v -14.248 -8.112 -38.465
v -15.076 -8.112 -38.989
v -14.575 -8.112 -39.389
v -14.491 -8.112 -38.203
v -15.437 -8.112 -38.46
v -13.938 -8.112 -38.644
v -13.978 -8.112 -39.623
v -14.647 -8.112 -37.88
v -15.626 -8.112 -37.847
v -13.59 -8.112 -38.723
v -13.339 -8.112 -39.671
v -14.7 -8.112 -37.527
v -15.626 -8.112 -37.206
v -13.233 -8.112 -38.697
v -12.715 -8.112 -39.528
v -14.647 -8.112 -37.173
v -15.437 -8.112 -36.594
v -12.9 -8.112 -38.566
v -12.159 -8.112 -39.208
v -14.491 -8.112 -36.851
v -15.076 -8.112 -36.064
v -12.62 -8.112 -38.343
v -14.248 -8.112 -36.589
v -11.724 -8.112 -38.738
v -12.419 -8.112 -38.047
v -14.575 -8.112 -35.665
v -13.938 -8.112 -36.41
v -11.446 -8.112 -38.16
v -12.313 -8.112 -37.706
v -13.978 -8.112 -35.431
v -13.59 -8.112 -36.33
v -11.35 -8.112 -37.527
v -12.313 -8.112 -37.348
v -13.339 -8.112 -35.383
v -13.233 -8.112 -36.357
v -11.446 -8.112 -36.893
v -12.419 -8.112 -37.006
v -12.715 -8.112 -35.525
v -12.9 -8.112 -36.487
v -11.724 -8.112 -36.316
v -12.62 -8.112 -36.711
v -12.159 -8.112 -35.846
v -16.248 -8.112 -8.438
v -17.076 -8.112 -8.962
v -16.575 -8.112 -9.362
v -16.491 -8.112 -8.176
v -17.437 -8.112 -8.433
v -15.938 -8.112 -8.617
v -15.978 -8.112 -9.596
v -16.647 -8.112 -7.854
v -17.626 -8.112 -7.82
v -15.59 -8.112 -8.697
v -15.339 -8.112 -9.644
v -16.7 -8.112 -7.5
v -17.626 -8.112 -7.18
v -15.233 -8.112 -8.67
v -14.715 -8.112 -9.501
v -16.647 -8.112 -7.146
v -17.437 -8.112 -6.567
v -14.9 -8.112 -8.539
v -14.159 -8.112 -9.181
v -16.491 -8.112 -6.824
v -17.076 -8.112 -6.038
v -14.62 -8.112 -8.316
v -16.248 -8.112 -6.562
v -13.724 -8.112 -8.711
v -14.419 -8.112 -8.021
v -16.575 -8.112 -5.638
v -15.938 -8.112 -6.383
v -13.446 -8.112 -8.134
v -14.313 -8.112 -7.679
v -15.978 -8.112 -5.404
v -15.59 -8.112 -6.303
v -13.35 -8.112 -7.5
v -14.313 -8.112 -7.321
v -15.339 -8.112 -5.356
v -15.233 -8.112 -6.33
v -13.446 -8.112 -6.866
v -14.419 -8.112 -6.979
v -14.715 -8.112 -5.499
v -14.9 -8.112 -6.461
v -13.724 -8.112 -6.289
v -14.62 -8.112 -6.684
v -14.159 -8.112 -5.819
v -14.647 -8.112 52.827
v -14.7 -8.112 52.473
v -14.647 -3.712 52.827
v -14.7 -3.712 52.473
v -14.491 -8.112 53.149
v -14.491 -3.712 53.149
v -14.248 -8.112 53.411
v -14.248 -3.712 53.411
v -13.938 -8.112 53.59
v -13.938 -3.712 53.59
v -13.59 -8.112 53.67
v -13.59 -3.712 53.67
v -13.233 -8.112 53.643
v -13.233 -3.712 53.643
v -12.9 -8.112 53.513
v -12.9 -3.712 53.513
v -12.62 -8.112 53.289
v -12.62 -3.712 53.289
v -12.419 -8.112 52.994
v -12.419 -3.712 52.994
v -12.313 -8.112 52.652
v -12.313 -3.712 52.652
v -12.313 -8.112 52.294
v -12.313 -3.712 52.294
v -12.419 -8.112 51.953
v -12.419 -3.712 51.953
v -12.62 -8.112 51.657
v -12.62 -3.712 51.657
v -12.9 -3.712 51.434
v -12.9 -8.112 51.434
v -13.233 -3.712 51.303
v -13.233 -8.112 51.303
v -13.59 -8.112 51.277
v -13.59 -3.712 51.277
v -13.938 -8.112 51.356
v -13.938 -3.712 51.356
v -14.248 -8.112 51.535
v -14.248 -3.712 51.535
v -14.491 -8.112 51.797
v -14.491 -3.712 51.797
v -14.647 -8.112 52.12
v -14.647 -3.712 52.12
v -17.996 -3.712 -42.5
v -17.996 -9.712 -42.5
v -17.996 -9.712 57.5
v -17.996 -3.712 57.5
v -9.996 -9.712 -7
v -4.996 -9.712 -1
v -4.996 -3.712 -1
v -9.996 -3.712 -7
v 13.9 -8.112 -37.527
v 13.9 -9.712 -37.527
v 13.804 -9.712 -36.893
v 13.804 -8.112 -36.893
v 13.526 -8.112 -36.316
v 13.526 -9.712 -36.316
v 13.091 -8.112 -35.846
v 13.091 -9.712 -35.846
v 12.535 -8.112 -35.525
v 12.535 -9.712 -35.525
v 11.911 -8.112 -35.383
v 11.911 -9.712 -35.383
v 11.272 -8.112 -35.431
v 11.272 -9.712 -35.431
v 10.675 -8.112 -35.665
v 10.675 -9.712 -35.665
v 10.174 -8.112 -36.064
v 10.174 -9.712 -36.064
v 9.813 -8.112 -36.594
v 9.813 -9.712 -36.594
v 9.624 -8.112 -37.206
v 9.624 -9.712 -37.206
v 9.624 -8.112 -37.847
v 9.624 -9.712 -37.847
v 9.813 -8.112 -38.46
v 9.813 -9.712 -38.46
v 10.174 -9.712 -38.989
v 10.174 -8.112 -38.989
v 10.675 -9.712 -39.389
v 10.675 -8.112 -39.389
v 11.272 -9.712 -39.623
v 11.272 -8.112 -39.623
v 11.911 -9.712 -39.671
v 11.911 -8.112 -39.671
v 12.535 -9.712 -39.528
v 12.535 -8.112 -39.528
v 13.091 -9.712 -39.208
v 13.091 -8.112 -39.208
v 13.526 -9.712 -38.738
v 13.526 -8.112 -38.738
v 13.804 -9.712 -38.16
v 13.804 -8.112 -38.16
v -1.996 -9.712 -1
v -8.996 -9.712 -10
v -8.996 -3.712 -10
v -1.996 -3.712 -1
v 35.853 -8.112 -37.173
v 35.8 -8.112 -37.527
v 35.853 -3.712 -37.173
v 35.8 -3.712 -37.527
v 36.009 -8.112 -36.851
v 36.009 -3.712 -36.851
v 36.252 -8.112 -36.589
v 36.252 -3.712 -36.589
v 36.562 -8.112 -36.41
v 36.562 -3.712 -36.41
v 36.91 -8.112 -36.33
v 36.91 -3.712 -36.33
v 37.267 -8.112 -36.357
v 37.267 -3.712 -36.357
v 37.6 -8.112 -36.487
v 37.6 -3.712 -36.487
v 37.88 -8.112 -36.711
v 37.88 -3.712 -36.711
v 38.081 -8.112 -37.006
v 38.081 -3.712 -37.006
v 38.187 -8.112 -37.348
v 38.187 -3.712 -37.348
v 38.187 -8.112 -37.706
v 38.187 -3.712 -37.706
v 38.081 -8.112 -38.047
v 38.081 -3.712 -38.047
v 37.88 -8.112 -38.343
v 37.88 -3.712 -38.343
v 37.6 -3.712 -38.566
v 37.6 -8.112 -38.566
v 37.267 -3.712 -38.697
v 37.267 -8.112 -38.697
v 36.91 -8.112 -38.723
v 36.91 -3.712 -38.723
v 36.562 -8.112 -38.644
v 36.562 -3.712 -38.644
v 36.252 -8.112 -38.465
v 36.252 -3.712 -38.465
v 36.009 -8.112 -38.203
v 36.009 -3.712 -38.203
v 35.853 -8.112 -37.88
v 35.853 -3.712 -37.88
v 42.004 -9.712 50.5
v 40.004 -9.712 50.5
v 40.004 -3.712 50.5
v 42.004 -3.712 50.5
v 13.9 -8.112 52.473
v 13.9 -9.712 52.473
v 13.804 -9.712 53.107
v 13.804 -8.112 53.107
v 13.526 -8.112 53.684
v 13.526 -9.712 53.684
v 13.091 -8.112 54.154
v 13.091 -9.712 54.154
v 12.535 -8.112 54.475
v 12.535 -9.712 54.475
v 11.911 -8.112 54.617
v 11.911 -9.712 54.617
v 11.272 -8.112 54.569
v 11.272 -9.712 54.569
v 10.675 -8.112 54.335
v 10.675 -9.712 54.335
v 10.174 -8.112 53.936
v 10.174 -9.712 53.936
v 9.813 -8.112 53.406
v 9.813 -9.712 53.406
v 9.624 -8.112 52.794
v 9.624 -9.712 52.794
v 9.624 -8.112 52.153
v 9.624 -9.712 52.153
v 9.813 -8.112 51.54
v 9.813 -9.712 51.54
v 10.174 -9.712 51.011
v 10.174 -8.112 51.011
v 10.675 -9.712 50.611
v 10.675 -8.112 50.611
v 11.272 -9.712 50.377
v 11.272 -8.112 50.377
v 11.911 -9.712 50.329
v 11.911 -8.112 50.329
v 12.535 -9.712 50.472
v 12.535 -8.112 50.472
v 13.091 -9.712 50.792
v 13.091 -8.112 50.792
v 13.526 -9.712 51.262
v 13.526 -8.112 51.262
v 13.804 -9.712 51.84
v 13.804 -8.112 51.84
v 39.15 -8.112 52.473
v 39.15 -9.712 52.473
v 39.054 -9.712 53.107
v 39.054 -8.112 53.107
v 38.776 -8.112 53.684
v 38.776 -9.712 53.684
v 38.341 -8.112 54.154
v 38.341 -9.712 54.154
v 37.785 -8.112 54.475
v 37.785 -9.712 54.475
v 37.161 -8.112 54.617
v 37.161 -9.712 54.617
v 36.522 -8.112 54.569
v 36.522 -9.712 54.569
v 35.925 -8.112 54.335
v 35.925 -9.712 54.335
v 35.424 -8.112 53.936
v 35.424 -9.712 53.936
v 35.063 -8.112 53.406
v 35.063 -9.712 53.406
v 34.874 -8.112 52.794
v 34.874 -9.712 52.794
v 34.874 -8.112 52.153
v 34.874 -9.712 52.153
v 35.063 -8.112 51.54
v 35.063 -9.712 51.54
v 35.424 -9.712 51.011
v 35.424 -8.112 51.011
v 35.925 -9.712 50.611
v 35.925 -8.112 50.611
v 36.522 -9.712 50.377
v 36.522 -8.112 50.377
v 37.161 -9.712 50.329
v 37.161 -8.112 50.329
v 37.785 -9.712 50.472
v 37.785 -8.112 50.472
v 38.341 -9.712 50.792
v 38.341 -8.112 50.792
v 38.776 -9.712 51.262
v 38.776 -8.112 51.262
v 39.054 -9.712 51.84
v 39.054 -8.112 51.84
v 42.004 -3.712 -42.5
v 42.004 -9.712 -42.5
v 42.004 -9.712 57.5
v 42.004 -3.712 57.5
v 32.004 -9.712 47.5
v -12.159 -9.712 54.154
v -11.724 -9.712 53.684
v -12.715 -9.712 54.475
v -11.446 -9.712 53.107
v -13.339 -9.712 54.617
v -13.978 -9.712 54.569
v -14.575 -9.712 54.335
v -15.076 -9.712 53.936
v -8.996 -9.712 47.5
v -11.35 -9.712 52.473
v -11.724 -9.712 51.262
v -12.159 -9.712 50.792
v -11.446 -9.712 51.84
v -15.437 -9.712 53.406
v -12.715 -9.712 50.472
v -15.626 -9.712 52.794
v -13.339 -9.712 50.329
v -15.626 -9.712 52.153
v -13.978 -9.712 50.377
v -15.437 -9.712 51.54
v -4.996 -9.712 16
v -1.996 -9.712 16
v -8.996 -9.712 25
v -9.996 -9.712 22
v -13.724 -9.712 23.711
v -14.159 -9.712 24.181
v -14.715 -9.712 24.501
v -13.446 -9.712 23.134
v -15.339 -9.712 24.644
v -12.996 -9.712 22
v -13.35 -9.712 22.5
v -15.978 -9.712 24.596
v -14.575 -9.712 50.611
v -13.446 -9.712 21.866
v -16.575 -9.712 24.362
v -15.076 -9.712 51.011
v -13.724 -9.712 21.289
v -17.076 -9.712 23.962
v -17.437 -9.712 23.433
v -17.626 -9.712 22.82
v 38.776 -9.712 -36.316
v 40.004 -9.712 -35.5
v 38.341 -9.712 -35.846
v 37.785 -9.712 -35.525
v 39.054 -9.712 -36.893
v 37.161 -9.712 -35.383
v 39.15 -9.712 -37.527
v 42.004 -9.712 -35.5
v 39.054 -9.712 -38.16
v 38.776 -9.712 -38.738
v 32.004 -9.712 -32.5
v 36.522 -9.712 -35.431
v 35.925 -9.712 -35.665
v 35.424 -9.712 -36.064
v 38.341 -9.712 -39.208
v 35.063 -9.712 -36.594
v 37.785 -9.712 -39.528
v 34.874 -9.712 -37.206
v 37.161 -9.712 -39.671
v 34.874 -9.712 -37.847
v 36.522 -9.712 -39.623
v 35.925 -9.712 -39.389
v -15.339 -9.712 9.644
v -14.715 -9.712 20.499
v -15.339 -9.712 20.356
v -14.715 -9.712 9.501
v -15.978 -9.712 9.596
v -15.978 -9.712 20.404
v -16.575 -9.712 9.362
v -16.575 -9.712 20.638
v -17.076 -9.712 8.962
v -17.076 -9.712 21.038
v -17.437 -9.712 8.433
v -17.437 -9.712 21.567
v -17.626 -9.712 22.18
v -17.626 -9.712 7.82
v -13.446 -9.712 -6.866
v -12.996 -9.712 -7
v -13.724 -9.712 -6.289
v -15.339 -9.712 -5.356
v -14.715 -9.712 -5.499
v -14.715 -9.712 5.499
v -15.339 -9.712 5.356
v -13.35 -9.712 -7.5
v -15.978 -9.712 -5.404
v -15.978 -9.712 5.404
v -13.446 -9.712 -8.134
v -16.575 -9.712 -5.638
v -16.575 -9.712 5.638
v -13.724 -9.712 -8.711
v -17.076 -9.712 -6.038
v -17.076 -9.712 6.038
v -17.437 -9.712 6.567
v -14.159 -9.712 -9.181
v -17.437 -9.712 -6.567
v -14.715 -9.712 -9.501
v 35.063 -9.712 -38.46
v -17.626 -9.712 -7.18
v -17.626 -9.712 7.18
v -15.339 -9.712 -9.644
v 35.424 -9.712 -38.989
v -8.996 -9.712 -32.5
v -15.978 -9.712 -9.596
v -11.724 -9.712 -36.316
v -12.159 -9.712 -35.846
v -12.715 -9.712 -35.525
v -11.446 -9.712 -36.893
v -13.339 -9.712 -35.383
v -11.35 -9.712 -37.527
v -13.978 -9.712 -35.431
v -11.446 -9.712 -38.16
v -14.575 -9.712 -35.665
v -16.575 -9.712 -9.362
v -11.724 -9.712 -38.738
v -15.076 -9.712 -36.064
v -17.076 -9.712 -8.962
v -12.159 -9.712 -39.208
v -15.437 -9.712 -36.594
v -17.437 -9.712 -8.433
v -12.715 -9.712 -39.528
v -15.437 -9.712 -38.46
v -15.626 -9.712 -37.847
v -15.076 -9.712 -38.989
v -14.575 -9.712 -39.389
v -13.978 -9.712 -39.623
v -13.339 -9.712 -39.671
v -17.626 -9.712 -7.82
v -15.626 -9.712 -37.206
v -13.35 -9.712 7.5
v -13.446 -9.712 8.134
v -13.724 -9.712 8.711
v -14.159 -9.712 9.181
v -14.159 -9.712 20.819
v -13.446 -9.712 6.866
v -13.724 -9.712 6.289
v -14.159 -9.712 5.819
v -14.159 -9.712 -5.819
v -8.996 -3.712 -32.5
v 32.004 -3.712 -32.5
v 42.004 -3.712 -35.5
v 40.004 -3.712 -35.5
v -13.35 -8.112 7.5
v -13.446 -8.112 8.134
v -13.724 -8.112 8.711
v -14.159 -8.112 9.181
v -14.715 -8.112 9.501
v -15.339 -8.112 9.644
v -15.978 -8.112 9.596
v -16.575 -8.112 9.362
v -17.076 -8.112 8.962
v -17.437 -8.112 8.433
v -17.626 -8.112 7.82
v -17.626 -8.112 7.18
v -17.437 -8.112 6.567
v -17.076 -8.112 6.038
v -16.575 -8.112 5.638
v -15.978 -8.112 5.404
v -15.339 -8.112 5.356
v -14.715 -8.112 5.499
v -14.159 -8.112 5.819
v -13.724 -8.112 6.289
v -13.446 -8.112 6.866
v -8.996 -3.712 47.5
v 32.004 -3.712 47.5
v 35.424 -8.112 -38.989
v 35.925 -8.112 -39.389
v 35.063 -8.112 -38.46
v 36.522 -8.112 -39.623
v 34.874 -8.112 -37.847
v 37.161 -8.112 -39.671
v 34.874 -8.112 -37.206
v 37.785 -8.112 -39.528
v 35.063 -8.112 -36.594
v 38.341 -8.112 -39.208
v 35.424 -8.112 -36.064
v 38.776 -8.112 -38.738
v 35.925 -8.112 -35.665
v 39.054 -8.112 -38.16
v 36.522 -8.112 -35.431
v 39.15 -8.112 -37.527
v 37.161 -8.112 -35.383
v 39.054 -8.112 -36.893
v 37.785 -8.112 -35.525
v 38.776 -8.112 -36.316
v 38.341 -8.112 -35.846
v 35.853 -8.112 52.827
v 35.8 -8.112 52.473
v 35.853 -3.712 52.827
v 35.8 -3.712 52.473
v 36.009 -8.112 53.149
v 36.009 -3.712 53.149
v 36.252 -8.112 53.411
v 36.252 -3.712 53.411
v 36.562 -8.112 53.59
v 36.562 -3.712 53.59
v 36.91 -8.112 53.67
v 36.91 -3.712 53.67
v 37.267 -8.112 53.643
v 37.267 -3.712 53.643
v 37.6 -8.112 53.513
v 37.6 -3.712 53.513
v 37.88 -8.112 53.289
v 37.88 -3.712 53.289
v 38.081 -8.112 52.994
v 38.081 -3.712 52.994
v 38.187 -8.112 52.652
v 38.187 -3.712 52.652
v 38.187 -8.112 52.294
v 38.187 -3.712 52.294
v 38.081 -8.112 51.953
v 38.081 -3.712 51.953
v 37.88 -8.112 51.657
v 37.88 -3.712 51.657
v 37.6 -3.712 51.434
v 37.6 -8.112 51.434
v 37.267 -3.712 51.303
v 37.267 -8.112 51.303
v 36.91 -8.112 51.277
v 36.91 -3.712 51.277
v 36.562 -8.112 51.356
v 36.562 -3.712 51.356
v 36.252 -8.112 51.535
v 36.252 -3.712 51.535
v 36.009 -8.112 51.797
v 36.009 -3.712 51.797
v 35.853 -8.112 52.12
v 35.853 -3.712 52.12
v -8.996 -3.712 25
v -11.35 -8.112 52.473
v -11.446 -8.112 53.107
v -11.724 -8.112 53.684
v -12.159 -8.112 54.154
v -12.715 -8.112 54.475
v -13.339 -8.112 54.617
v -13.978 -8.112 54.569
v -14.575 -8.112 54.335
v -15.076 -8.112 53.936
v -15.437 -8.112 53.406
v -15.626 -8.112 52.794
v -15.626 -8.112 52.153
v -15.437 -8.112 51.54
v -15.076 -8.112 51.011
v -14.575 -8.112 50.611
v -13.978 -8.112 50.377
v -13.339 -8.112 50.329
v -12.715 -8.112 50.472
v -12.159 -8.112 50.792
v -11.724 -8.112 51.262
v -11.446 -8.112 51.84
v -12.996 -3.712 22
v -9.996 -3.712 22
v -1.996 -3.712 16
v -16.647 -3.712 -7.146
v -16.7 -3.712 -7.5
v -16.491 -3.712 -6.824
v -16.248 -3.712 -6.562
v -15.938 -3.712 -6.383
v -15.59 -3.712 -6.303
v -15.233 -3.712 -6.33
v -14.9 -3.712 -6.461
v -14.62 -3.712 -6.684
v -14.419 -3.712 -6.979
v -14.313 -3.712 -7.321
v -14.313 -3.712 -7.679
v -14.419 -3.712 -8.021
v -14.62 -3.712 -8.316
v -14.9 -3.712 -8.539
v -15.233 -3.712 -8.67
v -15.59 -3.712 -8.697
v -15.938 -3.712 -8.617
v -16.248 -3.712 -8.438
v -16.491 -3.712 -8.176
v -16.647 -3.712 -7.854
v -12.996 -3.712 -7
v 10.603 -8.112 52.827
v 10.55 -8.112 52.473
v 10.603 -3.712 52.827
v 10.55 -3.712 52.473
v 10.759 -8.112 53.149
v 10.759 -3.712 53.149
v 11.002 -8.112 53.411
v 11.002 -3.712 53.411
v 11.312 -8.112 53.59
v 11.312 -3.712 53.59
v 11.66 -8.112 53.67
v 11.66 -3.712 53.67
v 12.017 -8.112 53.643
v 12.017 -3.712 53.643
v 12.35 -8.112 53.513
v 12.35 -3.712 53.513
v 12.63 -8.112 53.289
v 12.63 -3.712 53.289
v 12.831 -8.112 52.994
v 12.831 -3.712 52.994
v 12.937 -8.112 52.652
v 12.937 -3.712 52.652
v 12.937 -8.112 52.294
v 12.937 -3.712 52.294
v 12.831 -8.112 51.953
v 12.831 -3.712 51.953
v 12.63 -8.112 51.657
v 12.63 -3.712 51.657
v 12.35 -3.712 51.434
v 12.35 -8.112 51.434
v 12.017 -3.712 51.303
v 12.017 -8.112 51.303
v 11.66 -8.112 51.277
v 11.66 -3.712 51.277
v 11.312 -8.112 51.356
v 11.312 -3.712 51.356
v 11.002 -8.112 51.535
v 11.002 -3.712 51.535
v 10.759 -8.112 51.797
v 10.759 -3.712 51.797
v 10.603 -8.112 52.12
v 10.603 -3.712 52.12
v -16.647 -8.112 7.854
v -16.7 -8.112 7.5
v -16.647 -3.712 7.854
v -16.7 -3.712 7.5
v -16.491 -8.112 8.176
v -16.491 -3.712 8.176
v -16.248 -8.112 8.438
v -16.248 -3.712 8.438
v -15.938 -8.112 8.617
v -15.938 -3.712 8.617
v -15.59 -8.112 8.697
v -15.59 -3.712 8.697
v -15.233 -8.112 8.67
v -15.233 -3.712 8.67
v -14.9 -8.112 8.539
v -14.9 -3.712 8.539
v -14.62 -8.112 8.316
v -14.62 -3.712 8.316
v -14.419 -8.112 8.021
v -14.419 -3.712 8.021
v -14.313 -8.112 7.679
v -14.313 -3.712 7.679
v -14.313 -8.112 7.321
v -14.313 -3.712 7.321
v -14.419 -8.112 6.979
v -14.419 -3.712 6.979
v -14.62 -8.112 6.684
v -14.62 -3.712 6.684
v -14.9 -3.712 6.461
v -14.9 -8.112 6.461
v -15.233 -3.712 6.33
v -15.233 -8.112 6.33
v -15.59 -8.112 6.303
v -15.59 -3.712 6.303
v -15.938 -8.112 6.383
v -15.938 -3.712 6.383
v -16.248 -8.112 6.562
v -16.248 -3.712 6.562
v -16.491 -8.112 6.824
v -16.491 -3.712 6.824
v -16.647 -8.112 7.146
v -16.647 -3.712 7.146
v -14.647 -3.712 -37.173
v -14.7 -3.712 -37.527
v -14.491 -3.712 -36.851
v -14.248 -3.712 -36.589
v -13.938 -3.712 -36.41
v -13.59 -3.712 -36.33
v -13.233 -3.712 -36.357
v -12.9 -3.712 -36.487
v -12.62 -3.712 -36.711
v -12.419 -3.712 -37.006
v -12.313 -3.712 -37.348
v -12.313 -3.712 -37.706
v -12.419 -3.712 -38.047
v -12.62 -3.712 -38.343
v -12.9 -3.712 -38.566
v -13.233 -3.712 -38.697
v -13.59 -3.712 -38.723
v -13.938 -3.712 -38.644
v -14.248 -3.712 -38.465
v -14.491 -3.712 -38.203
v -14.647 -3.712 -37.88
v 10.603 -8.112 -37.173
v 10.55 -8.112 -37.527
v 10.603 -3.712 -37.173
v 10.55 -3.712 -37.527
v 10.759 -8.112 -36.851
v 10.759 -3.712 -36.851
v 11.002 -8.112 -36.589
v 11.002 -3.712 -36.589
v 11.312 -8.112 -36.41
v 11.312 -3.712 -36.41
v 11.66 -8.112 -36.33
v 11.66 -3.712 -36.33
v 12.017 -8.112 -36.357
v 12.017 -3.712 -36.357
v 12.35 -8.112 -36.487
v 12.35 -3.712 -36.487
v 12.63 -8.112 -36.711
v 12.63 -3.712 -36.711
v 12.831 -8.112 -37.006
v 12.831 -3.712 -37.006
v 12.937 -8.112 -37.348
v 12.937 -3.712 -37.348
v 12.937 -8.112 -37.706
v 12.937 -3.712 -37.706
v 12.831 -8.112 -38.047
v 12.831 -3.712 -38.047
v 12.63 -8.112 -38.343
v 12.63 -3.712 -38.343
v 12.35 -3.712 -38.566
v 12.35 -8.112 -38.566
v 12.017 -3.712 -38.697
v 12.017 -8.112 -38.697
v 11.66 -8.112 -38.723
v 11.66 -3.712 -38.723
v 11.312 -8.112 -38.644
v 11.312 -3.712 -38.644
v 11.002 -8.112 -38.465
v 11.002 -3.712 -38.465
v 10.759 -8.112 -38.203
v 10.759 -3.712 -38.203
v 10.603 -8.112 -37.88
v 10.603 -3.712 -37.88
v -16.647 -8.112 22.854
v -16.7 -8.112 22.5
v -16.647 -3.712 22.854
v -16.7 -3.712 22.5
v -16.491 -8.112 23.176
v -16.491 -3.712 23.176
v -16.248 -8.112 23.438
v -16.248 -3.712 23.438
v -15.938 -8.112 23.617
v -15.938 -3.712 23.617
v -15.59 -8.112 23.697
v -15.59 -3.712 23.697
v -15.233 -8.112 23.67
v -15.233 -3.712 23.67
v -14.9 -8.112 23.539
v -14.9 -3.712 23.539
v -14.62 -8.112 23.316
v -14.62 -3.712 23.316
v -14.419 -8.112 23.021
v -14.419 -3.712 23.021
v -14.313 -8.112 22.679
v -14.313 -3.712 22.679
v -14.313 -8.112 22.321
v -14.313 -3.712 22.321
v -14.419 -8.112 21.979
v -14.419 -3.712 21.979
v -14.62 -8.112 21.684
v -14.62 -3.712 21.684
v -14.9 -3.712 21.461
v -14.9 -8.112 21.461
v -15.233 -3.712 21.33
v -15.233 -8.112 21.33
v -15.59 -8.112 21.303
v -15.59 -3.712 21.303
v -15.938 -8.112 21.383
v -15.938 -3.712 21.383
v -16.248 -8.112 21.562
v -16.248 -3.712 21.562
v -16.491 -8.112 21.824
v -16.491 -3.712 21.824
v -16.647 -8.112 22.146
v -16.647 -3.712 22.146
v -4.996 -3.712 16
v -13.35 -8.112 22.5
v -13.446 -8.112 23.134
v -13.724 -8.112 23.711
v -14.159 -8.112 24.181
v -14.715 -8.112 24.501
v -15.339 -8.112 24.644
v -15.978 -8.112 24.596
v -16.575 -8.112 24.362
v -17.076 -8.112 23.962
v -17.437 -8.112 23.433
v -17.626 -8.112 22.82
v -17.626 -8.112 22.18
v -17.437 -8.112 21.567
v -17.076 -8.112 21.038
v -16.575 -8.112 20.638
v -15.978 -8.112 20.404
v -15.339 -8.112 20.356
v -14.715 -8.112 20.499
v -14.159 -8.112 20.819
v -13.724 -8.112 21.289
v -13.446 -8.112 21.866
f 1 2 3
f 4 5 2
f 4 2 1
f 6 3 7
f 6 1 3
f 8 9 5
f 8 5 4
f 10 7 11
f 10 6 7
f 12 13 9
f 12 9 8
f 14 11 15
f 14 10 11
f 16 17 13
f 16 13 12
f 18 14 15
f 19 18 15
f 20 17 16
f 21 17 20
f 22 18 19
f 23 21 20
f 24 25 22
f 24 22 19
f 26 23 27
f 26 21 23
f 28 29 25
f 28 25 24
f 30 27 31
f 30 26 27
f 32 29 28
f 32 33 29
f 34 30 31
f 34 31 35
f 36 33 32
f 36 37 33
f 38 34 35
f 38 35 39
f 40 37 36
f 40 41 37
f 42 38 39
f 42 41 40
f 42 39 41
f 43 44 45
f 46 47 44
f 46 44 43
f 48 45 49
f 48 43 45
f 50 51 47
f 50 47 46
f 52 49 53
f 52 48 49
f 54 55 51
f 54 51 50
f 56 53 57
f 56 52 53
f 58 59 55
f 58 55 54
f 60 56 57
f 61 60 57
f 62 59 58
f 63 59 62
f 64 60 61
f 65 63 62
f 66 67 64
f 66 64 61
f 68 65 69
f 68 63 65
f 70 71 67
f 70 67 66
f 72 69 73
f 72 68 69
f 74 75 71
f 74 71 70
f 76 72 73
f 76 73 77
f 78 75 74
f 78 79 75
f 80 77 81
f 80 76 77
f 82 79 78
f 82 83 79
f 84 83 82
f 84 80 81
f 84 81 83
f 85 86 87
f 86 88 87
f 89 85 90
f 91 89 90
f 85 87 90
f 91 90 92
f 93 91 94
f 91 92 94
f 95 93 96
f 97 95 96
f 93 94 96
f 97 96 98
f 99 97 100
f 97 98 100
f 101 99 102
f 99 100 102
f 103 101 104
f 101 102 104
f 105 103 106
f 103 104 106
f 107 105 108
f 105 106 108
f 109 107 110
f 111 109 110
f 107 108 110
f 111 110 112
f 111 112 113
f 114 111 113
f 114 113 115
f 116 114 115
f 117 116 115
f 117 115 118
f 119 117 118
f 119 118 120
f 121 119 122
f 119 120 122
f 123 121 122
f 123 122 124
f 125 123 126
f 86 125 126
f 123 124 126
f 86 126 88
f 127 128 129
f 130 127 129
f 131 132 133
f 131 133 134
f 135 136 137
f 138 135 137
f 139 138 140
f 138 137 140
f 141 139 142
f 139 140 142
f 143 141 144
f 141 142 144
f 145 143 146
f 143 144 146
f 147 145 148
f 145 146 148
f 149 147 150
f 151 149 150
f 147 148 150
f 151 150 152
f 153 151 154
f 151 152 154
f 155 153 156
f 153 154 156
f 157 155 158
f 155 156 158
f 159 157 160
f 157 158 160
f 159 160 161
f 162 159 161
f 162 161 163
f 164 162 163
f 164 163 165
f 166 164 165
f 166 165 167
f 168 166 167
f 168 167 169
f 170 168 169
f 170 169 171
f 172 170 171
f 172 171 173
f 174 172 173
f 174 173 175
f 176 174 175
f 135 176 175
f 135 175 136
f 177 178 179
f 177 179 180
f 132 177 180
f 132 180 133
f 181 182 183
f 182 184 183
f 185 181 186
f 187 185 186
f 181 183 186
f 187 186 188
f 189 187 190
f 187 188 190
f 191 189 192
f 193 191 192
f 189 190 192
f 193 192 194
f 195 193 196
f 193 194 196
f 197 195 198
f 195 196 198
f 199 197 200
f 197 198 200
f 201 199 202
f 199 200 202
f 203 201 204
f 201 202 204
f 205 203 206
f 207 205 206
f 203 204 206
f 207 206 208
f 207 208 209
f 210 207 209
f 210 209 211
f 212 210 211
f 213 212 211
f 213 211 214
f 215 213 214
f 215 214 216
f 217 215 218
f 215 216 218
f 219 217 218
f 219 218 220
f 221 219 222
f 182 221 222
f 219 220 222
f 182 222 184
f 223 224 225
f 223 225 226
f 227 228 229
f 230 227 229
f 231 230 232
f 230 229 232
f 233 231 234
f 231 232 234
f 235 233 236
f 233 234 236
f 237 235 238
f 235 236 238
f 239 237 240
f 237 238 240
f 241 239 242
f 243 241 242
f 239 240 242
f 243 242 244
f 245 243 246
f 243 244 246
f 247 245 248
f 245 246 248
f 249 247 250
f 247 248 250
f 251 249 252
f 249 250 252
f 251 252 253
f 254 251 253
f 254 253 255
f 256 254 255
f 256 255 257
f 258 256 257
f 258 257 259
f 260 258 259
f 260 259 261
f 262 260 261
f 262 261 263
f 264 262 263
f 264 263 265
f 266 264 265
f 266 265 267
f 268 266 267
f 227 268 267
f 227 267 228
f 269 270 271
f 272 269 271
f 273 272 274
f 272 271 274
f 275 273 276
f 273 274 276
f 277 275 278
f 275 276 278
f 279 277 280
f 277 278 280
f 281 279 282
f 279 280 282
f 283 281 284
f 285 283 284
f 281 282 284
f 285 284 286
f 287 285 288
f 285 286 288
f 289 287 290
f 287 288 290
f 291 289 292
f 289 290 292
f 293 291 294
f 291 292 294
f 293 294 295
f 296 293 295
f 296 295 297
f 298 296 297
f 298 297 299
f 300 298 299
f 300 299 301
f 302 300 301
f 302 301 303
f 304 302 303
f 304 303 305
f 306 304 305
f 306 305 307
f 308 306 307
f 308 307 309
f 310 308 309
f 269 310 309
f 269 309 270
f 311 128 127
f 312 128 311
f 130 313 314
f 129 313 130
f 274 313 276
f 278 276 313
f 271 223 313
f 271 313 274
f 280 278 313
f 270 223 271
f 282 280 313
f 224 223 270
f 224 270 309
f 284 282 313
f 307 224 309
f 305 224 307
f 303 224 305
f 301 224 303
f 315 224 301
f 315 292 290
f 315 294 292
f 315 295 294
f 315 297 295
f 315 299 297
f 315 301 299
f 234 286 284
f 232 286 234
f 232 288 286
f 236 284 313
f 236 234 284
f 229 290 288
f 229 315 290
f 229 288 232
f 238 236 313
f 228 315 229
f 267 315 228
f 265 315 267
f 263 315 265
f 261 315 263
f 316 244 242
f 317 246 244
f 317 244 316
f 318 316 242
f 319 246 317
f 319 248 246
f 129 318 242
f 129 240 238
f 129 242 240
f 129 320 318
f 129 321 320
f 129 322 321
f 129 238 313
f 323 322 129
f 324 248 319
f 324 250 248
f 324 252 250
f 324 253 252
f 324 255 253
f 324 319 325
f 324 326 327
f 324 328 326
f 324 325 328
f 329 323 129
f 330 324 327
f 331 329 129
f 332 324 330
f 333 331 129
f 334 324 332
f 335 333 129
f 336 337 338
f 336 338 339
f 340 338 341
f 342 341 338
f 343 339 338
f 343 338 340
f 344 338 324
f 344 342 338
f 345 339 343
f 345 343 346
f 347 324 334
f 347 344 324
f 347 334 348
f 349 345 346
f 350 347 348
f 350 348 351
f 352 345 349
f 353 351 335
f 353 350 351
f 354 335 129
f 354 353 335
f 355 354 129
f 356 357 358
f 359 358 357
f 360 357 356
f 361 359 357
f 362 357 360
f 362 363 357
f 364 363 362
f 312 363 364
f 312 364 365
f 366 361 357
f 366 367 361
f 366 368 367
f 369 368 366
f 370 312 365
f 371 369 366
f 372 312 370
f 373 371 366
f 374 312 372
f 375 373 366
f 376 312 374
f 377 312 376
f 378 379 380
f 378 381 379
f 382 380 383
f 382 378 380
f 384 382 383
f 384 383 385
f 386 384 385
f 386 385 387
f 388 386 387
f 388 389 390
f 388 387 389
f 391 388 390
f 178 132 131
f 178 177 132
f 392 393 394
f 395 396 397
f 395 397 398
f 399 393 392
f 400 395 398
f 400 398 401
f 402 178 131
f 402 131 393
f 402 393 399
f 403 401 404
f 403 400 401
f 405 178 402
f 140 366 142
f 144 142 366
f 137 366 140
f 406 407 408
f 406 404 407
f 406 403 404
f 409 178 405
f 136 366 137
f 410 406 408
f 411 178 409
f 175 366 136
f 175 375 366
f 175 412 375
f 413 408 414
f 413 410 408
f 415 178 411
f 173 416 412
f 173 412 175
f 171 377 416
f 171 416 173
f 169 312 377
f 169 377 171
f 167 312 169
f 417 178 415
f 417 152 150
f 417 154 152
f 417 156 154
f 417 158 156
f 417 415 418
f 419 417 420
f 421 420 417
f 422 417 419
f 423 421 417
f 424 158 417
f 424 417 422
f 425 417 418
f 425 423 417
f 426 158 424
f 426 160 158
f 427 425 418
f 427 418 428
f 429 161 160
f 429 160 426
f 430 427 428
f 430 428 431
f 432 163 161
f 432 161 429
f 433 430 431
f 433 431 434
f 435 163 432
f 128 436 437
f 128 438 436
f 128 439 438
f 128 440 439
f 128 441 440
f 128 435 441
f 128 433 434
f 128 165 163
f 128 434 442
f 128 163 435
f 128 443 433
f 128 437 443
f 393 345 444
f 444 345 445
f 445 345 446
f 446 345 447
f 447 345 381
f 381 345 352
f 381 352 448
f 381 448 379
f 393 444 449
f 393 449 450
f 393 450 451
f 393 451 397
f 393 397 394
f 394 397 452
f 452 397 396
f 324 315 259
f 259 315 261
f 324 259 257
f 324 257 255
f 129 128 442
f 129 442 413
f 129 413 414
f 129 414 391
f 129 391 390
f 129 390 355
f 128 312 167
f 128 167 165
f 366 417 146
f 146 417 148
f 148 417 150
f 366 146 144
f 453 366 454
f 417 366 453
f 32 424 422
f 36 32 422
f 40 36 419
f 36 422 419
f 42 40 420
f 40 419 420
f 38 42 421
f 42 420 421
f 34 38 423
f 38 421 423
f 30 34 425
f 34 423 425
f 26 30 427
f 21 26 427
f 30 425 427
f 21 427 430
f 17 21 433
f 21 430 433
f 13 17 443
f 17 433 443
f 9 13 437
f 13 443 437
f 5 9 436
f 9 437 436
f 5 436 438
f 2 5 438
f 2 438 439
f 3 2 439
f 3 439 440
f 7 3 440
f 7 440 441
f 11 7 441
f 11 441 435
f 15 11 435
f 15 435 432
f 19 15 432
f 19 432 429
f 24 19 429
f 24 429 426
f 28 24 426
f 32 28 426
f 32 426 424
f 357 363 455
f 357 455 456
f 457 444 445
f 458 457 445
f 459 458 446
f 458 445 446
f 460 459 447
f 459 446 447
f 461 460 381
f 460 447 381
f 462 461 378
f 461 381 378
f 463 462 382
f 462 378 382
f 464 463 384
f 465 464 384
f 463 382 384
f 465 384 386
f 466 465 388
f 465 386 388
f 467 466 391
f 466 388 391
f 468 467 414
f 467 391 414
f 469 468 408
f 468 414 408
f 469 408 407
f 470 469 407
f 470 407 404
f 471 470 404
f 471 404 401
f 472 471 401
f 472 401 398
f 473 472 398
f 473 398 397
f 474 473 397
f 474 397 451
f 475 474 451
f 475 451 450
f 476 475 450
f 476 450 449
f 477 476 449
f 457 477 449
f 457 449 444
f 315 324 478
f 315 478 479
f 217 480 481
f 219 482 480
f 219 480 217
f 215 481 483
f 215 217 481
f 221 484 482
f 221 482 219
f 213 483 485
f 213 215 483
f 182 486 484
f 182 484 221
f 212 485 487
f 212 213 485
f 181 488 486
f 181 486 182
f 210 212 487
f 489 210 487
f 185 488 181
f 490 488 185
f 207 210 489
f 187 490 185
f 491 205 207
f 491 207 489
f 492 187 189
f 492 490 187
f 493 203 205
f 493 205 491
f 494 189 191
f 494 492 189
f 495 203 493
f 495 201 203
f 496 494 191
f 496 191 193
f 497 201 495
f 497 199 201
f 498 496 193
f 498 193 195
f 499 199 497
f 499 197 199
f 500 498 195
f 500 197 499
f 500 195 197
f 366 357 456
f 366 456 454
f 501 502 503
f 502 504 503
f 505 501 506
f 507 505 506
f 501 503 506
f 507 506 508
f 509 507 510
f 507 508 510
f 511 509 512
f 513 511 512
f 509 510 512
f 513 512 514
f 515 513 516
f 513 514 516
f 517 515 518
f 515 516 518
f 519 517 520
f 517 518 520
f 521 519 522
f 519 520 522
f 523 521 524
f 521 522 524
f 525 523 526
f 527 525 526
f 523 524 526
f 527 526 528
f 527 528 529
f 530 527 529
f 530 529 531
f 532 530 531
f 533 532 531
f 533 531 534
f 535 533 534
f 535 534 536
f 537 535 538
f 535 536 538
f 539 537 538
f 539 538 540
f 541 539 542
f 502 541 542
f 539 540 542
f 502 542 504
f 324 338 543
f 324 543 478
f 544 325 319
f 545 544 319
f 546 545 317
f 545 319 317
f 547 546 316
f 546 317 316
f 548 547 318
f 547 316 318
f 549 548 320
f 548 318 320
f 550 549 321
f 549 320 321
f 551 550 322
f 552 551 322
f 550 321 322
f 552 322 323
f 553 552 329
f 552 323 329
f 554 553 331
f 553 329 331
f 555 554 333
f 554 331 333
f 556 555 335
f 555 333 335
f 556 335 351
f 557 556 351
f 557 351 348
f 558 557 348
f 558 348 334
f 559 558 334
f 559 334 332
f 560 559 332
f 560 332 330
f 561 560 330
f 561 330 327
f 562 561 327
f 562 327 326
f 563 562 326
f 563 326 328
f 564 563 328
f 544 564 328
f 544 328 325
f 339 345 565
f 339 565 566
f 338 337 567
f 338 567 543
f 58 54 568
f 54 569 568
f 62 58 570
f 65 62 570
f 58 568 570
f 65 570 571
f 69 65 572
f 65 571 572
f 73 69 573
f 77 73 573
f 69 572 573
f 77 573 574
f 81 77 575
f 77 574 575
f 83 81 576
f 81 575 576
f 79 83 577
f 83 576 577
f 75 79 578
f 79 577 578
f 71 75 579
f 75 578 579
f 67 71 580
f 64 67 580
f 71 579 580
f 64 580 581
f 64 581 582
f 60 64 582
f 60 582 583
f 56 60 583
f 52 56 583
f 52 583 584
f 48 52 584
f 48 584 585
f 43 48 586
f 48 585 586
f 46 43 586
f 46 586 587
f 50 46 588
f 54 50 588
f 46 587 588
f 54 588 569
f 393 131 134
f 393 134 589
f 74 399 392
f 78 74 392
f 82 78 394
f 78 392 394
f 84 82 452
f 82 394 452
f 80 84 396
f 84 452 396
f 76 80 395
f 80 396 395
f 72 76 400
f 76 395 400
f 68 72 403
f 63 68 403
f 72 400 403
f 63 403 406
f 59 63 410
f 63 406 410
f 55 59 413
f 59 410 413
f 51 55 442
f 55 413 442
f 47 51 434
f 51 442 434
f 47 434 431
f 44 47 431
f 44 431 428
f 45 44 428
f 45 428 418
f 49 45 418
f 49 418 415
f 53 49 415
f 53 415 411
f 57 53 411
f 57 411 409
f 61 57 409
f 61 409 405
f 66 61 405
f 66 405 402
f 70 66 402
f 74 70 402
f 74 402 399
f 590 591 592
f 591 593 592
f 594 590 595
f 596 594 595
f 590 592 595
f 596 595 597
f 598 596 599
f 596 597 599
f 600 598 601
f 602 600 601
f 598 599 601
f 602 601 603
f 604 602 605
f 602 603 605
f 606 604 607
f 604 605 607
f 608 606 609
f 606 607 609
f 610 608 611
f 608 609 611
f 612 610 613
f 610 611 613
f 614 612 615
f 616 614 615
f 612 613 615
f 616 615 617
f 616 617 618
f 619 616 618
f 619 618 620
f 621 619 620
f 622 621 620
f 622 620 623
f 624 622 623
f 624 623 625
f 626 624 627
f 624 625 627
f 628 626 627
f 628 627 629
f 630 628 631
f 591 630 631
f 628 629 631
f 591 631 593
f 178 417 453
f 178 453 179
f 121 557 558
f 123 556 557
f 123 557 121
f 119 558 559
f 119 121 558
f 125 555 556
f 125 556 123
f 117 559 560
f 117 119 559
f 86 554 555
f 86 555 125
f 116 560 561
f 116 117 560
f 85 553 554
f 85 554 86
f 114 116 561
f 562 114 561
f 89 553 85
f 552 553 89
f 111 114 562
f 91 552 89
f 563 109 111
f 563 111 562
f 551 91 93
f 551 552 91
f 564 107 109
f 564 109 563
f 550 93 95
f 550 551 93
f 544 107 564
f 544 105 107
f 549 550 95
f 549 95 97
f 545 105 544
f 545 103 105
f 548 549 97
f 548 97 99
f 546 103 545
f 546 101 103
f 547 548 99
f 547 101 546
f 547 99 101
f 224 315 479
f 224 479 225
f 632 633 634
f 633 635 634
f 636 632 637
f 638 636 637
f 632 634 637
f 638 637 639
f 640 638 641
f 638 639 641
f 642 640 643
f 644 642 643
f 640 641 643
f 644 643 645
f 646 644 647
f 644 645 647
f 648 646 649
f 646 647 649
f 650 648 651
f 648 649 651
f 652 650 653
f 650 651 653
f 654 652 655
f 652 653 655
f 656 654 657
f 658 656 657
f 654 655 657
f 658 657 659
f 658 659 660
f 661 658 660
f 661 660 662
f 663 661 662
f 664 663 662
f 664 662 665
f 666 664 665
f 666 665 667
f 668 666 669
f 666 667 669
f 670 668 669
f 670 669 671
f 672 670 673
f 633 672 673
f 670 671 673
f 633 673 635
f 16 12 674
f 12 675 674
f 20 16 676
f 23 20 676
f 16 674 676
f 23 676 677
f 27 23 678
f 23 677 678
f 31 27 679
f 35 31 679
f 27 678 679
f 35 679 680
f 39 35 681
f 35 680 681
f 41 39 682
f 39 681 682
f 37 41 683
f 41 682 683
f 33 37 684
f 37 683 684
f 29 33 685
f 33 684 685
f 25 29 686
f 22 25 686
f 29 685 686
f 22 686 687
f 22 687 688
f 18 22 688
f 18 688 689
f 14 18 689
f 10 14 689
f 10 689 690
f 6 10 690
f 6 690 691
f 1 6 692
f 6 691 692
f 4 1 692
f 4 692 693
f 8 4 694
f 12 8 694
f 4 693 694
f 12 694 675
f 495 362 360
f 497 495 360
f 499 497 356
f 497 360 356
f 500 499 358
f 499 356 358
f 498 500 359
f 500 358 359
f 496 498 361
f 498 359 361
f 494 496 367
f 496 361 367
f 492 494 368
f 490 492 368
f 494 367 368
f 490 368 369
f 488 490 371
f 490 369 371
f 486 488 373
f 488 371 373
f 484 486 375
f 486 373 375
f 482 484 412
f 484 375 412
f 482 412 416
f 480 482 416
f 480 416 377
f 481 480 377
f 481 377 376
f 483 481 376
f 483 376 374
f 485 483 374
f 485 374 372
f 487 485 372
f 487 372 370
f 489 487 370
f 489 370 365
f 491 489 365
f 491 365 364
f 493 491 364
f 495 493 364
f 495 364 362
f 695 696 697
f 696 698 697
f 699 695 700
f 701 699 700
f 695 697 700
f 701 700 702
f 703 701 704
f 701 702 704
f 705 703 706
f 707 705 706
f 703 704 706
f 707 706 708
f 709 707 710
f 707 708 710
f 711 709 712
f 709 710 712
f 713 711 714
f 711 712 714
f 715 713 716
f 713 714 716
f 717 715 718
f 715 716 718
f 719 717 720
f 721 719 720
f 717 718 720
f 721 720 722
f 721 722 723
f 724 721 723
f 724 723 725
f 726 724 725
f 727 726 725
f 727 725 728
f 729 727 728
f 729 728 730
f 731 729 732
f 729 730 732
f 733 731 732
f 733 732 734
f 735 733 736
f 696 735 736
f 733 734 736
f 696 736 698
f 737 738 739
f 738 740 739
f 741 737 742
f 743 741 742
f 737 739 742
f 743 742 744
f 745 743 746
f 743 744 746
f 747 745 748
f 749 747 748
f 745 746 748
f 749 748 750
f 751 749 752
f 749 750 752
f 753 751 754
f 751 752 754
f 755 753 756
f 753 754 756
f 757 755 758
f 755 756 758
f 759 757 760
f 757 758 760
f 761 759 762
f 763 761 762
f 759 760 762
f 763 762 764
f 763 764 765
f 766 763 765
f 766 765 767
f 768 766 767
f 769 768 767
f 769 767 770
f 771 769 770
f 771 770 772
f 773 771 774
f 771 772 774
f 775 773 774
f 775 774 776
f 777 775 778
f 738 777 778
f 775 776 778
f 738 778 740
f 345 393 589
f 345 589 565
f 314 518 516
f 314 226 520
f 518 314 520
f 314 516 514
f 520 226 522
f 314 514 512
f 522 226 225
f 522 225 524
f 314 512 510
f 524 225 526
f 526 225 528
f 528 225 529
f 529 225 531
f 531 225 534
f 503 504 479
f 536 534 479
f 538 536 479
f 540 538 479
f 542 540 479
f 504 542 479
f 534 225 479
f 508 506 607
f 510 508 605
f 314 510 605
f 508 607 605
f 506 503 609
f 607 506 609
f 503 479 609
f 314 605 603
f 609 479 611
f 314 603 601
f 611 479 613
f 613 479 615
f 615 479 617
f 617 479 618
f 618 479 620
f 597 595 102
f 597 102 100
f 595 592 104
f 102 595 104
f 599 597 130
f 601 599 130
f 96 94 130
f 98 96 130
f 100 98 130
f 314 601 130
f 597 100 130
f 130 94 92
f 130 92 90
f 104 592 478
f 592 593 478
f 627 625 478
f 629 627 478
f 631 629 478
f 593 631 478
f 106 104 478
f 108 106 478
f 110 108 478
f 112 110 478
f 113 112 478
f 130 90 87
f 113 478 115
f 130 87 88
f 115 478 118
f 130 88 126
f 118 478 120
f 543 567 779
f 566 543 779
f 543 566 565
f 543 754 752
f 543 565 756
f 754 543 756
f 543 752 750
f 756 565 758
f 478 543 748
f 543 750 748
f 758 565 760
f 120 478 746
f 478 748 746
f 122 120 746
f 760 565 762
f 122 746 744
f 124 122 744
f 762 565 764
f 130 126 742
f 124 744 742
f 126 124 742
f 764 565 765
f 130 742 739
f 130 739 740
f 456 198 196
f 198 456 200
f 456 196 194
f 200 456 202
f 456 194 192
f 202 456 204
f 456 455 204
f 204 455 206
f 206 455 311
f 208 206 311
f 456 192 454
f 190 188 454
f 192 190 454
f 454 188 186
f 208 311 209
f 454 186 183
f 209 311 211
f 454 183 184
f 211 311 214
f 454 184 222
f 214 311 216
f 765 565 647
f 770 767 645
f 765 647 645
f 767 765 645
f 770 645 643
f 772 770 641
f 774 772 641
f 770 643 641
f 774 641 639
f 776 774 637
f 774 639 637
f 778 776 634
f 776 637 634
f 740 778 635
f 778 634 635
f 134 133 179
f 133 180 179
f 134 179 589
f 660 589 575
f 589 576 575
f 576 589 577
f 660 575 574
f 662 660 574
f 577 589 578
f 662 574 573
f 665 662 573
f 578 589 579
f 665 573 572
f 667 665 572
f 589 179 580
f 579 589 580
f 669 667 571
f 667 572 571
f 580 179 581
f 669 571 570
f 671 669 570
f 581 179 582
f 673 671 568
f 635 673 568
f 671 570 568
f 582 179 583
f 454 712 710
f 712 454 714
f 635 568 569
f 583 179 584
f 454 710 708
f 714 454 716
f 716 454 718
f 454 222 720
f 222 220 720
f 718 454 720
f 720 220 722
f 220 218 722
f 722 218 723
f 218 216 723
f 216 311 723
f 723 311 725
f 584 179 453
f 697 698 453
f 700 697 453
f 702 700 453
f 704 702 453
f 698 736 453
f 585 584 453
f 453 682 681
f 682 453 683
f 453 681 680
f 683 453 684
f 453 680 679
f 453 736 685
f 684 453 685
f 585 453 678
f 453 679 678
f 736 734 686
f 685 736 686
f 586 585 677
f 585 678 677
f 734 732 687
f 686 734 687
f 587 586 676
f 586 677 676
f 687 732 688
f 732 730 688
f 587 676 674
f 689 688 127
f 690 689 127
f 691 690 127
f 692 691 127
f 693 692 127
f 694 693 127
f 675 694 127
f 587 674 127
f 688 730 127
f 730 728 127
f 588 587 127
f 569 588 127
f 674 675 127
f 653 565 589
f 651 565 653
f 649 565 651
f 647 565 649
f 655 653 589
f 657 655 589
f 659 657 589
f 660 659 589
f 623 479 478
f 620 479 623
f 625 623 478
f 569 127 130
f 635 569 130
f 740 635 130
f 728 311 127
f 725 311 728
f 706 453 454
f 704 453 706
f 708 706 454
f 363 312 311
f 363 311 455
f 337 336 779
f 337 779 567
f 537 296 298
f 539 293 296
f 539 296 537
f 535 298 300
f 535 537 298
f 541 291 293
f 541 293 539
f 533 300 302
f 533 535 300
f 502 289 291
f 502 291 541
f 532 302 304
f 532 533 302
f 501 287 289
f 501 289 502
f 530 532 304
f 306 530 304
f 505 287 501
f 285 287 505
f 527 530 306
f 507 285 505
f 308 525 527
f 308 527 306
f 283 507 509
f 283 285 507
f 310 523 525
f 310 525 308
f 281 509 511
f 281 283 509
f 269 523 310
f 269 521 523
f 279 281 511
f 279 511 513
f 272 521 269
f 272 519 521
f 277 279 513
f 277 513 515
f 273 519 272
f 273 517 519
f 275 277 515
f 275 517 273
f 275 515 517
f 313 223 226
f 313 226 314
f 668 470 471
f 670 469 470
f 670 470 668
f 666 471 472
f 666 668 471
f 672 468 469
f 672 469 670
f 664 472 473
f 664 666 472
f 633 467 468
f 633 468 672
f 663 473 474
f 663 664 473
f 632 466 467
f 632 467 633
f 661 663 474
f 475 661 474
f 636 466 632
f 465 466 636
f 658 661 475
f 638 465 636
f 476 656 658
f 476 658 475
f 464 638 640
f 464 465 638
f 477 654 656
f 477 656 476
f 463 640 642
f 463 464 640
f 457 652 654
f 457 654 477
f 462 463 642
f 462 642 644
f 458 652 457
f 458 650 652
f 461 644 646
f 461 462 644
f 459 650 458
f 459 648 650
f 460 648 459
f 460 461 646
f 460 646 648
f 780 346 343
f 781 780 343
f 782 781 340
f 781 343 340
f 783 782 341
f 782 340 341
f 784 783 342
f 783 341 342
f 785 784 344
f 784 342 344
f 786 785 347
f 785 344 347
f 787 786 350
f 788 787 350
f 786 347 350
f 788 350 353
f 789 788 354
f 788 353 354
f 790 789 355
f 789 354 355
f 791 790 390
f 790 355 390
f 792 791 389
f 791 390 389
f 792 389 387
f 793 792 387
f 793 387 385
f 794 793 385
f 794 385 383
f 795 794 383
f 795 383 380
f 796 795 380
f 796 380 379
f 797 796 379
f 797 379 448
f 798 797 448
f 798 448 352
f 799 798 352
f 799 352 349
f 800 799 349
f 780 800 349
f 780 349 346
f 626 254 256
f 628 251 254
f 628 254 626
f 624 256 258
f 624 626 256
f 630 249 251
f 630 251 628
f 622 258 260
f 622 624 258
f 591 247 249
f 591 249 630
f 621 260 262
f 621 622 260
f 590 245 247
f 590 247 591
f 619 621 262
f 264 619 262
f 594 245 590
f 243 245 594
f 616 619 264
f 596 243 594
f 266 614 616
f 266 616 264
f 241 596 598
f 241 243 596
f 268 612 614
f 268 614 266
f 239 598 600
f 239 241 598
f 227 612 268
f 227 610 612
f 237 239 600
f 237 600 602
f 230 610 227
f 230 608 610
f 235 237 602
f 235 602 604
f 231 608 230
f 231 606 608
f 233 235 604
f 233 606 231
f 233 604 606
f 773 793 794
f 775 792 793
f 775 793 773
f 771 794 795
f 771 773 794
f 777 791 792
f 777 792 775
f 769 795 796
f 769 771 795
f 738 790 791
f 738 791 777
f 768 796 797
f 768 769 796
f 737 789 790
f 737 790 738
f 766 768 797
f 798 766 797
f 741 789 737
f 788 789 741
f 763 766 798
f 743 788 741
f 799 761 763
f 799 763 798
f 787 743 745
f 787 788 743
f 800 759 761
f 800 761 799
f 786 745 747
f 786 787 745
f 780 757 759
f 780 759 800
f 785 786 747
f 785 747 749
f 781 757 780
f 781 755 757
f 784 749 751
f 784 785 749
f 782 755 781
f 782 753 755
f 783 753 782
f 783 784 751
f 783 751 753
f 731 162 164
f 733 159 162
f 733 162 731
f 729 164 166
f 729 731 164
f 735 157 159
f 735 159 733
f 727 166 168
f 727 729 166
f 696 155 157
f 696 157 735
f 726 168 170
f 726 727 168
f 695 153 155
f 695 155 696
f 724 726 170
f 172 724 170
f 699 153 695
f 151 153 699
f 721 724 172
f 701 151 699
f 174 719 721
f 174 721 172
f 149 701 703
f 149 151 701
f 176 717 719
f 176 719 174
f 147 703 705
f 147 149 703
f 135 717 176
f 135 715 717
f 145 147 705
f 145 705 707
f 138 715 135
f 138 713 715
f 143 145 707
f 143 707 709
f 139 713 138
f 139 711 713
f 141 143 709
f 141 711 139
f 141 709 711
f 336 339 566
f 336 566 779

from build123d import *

# Parameters (mm, degrees)
PAD_DEPTH           = 6
HOLE_D              = 2.4
HOLE_CBORE_D        = 4.3
HOLE_CBORE_DEPTH    = 1.6
HOLE001_D           = 2.4
HOLE001_CBORE_D     = 4.3
HOLE001_CBORE_DEPTH = 1.6


with BuildPart() as part:
    # Sketch001 → Pad (new body)
    with BuildSketch(Plane(origin=(-8.845912, -9.712389, 7.5), x_dir=(1, 0, 0), z_dir=(0, 1, 0))):
        Polygon((3.85, 8.5), (-1.15, 14.5), (-4.15, 14.5), (-4.15, -14.5), (-1.15, -14.5), (3.85, -8.5), (6.85, -8.5), (-0.15, -17.5), (-0.15, -40), (40.85, -40), (48.85, -43), (50.85, -43), (50.85, -50), (-9.15, -50), (-9.15, -17.5), (-9.15, 17.5), (-9.15, 50), (50.85, 50), (50.85, 43), (48.85, 43), (40.85, 40), (-0.15, 40), (-0.15, 17.5), (6.85, 8.5), align=None)
    extrude(amount=PAD_DEPTH)

    # Hole (through all)
    with Locations(Plane(origin=(-8.845912, -9.712389, 7.5), x_dir=(1, 0, 0), z_dir=(0, -1, 0))):
        with Locations((-6.654088, 0), (-6.654088, 15), (-6.654088, -15)):
            CounterBoreHole(HOLE_D / 2, HOLE_CBORE_D / 2, HOLE_CBORE_DEPTH)

    # Hole001 (through all)
    with Locations(Plane(origin=(-8.845912, -9.712389, 7.5), x_dir=(1, 0, 0), z_dir=(0, -1, 0))):
        with Locations((20.595912, 44.973288), (20.595912, -45.026712), (-4.654088, -45.026712), (45.845912, -45.026712), (-4.654088, 44.973288), (45.845912, 44.973288)):
            CounterBoreHole(HOLE001_D / 2, HOLE001_CBORE_D / 2, HOLE001_CBORE_DEPTH)


solid = part.part
